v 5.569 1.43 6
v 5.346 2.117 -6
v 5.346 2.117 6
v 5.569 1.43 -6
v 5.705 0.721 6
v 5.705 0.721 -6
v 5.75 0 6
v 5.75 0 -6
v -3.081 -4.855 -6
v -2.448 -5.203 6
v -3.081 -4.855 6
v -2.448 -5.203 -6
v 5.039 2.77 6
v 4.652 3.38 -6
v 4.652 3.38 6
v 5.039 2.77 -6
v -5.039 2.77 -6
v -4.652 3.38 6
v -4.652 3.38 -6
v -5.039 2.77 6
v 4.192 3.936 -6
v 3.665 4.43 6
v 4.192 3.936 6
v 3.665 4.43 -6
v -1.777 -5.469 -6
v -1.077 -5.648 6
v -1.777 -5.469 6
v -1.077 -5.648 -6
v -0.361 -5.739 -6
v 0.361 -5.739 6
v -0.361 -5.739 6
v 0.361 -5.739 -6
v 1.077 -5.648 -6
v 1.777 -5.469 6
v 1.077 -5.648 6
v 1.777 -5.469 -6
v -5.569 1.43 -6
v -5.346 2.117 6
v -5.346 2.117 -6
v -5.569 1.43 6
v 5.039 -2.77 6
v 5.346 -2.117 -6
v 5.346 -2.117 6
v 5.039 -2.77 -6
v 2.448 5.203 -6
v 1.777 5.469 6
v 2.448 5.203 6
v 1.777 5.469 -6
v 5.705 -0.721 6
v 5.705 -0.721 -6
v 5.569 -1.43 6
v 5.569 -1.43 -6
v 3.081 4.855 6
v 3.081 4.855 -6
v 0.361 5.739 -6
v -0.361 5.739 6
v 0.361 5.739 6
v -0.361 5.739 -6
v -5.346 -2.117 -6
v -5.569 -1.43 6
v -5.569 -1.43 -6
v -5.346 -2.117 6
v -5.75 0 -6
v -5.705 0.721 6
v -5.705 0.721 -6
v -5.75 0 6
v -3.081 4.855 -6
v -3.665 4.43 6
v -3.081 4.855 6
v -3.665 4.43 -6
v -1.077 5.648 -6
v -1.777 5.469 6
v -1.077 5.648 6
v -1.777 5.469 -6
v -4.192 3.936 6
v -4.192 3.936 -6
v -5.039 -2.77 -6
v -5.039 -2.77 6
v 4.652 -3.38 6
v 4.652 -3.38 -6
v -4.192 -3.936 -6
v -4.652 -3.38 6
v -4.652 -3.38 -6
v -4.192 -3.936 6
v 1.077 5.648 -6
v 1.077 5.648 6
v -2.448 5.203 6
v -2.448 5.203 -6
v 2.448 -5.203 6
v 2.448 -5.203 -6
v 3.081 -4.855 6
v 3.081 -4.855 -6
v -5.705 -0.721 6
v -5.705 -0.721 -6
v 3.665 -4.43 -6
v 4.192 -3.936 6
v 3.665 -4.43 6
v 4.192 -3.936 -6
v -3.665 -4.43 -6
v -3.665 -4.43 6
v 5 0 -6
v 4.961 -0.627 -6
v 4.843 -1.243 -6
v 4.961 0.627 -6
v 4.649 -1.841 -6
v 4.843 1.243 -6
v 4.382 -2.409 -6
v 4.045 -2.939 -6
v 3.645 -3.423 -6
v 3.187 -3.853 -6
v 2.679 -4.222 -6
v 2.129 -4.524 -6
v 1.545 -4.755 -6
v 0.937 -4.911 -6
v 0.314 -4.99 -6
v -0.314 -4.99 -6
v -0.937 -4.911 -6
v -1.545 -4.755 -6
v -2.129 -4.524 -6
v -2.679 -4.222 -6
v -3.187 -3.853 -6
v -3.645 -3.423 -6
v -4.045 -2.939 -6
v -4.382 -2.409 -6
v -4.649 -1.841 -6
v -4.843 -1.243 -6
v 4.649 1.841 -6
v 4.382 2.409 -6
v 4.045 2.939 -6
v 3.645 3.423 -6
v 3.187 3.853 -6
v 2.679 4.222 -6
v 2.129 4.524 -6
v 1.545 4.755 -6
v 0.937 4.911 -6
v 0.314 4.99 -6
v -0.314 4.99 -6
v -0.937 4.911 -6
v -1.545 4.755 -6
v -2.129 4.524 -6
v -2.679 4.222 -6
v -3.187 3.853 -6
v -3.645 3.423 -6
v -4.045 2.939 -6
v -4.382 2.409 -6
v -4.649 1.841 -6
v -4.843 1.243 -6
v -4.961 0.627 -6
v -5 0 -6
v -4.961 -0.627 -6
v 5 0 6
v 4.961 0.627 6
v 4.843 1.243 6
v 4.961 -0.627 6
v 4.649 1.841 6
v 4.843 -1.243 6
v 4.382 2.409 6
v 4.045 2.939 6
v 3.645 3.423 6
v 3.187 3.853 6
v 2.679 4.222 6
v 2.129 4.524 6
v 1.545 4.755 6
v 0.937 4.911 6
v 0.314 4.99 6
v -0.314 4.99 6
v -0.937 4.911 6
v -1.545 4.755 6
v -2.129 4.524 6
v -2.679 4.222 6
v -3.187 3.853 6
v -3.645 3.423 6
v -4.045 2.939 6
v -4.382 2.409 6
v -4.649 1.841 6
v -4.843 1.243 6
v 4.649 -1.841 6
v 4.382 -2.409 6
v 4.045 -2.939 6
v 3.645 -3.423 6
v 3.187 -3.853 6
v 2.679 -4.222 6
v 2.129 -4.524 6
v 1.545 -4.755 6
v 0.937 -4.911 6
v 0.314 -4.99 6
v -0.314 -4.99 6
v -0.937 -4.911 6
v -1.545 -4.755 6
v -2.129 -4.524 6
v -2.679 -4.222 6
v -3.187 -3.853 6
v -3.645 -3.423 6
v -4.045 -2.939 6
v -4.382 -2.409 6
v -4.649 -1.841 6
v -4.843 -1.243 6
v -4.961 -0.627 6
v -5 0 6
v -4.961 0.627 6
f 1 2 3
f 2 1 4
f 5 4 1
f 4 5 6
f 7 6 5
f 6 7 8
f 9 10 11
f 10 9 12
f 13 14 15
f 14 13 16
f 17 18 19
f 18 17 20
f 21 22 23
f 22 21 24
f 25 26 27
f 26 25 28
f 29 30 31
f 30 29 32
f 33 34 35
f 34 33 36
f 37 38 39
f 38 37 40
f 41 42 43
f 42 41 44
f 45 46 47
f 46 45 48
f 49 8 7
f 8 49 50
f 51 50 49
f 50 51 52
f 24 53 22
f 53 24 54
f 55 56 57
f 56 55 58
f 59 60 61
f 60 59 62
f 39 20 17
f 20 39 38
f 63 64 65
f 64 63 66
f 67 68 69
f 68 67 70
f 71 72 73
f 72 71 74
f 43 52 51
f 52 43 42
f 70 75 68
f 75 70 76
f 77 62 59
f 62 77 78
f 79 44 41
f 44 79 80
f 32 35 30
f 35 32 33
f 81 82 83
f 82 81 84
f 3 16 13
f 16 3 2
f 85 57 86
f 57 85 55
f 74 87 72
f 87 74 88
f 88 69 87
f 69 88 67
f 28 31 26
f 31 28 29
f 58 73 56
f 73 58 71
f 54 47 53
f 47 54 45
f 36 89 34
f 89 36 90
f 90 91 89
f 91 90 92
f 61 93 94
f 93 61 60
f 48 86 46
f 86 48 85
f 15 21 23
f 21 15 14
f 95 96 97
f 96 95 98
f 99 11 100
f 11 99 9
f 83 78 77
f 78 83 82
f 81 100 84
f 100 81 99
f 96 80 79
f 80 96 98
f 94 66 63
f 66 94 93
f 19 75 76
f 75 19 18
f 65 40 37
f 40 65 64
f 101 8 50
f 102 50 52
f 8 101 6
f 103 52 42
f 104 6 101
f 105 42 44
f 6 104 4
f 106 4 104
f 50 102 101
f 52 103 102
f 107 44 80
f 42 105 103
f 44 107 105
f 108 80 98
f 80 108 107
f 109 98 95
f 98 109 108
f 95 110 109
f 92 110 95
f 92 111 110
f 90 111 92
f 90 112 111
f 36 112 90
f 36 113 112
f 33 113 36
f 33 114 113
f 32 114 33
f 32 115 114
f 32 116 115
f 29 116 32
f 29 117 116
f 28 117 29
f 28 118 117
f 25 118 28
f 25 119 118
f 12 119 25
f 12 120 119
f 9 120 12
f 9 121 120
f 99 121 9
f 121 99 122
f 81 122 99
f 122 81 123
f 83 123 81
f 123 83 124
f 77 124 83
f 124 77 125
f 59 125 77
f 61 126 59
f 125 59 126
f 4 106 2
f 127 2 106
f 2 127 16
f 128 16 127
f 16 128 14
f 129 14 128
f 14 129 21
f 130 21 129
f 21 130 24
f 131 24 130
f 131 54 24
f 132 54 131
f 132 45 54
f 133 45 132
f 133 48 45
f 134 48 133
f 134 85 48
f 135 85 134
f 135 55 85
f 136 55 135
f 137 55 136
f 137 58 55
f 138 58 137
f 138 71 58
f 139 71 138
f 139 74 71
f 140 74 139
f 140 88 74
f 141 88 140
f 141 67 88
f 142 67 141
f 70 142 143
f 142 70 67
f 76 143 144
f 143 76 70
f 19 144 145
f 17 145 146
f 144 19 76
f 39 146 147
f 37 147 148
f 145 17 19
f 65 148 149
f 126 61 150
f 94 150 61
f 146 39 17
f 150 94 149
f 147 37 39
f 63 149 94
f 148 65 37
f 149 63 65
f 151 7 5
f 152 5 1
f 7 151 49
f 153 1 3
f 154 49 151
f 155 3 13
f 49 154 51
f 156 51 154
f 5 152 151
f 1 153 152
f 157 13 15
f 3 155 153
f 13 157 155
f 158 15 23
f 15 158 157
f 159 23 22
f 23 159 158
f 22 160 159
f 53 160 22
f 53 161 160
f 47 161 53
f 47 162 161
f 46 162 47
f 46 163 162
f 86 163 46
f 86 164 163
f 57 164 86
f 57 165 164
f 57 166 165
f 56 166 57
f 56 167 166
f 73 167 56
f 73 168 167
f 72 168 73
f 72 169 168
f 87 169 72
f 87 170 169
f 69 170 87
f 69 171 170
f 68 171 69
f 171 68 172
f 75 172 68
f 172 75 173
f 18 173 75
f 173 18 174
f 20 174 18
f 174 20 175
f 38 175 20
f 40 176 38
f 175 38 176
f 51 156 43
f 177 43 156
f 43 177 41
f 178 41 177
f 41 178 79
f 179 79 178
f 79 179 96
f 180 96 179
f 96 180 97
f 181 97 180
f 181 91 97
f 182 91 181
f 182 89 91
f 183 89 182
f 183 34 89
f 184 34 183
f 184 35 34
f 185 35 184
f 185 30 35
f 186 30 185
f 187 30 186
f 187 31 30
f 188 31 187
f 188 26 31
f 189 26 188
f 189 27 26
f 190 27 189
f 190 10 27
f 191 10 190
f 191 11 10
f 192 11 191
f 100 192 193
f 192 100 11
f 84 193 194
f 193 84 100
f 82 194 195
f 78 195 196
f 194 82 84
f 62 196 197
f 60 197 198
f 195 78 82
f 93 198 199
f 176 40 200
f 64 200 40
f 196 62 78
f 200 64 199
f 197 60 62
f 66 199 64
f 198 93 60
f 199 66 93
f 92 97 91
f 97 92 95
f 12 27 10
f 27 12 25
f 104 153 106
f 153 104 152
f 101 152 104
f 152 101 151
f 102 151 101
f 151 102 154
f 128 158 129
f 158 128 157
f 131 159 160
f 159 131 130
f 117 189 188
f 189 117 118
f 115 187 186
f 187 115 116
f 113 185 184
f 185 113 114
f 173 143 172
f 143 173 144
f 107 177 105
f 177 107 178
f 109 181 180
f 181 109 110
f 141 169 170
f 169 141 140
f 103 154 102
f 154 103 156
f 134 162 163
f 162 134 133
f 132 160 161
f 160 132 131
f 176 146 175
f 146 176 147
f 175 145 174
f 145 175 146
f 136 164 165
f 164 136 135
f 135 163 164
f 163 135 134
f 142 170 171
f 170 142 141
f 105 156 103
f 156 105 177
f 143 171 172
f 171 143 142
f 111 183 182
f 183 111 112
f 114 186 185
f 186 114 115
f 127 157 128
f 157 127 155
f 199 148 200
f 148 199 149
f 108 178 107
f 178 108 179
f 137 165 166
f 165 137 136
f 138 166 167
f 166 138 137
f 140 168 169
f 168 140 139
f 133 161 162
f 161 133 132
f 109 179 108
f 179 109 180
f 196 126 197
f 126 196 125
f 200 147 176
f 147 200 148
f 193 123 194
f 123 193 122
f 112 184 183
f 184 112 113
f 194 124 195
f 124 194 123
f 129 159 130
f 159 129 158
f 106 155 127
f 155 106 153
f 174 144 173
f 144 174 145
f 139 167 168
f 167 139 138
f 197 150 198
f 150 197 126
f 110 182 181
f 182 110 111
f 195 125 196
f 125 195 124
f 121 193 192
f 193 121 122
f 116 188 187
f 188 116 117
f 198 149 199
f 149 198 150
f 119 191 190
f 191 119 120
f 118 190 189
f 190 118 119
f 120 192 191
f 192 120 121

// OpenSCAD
$fn = 50;


difference() {
	union() {
		translate(v = [0, 0, -6.0000000000]) {
			cylinder(h = 12, r = 5.7500000000);
		}
	}
	union() {
		translate(v = [0, 0, -100.0000000000]) {
			cylinder(h = 200, r = 5.0000000000);
		}
	}
}
